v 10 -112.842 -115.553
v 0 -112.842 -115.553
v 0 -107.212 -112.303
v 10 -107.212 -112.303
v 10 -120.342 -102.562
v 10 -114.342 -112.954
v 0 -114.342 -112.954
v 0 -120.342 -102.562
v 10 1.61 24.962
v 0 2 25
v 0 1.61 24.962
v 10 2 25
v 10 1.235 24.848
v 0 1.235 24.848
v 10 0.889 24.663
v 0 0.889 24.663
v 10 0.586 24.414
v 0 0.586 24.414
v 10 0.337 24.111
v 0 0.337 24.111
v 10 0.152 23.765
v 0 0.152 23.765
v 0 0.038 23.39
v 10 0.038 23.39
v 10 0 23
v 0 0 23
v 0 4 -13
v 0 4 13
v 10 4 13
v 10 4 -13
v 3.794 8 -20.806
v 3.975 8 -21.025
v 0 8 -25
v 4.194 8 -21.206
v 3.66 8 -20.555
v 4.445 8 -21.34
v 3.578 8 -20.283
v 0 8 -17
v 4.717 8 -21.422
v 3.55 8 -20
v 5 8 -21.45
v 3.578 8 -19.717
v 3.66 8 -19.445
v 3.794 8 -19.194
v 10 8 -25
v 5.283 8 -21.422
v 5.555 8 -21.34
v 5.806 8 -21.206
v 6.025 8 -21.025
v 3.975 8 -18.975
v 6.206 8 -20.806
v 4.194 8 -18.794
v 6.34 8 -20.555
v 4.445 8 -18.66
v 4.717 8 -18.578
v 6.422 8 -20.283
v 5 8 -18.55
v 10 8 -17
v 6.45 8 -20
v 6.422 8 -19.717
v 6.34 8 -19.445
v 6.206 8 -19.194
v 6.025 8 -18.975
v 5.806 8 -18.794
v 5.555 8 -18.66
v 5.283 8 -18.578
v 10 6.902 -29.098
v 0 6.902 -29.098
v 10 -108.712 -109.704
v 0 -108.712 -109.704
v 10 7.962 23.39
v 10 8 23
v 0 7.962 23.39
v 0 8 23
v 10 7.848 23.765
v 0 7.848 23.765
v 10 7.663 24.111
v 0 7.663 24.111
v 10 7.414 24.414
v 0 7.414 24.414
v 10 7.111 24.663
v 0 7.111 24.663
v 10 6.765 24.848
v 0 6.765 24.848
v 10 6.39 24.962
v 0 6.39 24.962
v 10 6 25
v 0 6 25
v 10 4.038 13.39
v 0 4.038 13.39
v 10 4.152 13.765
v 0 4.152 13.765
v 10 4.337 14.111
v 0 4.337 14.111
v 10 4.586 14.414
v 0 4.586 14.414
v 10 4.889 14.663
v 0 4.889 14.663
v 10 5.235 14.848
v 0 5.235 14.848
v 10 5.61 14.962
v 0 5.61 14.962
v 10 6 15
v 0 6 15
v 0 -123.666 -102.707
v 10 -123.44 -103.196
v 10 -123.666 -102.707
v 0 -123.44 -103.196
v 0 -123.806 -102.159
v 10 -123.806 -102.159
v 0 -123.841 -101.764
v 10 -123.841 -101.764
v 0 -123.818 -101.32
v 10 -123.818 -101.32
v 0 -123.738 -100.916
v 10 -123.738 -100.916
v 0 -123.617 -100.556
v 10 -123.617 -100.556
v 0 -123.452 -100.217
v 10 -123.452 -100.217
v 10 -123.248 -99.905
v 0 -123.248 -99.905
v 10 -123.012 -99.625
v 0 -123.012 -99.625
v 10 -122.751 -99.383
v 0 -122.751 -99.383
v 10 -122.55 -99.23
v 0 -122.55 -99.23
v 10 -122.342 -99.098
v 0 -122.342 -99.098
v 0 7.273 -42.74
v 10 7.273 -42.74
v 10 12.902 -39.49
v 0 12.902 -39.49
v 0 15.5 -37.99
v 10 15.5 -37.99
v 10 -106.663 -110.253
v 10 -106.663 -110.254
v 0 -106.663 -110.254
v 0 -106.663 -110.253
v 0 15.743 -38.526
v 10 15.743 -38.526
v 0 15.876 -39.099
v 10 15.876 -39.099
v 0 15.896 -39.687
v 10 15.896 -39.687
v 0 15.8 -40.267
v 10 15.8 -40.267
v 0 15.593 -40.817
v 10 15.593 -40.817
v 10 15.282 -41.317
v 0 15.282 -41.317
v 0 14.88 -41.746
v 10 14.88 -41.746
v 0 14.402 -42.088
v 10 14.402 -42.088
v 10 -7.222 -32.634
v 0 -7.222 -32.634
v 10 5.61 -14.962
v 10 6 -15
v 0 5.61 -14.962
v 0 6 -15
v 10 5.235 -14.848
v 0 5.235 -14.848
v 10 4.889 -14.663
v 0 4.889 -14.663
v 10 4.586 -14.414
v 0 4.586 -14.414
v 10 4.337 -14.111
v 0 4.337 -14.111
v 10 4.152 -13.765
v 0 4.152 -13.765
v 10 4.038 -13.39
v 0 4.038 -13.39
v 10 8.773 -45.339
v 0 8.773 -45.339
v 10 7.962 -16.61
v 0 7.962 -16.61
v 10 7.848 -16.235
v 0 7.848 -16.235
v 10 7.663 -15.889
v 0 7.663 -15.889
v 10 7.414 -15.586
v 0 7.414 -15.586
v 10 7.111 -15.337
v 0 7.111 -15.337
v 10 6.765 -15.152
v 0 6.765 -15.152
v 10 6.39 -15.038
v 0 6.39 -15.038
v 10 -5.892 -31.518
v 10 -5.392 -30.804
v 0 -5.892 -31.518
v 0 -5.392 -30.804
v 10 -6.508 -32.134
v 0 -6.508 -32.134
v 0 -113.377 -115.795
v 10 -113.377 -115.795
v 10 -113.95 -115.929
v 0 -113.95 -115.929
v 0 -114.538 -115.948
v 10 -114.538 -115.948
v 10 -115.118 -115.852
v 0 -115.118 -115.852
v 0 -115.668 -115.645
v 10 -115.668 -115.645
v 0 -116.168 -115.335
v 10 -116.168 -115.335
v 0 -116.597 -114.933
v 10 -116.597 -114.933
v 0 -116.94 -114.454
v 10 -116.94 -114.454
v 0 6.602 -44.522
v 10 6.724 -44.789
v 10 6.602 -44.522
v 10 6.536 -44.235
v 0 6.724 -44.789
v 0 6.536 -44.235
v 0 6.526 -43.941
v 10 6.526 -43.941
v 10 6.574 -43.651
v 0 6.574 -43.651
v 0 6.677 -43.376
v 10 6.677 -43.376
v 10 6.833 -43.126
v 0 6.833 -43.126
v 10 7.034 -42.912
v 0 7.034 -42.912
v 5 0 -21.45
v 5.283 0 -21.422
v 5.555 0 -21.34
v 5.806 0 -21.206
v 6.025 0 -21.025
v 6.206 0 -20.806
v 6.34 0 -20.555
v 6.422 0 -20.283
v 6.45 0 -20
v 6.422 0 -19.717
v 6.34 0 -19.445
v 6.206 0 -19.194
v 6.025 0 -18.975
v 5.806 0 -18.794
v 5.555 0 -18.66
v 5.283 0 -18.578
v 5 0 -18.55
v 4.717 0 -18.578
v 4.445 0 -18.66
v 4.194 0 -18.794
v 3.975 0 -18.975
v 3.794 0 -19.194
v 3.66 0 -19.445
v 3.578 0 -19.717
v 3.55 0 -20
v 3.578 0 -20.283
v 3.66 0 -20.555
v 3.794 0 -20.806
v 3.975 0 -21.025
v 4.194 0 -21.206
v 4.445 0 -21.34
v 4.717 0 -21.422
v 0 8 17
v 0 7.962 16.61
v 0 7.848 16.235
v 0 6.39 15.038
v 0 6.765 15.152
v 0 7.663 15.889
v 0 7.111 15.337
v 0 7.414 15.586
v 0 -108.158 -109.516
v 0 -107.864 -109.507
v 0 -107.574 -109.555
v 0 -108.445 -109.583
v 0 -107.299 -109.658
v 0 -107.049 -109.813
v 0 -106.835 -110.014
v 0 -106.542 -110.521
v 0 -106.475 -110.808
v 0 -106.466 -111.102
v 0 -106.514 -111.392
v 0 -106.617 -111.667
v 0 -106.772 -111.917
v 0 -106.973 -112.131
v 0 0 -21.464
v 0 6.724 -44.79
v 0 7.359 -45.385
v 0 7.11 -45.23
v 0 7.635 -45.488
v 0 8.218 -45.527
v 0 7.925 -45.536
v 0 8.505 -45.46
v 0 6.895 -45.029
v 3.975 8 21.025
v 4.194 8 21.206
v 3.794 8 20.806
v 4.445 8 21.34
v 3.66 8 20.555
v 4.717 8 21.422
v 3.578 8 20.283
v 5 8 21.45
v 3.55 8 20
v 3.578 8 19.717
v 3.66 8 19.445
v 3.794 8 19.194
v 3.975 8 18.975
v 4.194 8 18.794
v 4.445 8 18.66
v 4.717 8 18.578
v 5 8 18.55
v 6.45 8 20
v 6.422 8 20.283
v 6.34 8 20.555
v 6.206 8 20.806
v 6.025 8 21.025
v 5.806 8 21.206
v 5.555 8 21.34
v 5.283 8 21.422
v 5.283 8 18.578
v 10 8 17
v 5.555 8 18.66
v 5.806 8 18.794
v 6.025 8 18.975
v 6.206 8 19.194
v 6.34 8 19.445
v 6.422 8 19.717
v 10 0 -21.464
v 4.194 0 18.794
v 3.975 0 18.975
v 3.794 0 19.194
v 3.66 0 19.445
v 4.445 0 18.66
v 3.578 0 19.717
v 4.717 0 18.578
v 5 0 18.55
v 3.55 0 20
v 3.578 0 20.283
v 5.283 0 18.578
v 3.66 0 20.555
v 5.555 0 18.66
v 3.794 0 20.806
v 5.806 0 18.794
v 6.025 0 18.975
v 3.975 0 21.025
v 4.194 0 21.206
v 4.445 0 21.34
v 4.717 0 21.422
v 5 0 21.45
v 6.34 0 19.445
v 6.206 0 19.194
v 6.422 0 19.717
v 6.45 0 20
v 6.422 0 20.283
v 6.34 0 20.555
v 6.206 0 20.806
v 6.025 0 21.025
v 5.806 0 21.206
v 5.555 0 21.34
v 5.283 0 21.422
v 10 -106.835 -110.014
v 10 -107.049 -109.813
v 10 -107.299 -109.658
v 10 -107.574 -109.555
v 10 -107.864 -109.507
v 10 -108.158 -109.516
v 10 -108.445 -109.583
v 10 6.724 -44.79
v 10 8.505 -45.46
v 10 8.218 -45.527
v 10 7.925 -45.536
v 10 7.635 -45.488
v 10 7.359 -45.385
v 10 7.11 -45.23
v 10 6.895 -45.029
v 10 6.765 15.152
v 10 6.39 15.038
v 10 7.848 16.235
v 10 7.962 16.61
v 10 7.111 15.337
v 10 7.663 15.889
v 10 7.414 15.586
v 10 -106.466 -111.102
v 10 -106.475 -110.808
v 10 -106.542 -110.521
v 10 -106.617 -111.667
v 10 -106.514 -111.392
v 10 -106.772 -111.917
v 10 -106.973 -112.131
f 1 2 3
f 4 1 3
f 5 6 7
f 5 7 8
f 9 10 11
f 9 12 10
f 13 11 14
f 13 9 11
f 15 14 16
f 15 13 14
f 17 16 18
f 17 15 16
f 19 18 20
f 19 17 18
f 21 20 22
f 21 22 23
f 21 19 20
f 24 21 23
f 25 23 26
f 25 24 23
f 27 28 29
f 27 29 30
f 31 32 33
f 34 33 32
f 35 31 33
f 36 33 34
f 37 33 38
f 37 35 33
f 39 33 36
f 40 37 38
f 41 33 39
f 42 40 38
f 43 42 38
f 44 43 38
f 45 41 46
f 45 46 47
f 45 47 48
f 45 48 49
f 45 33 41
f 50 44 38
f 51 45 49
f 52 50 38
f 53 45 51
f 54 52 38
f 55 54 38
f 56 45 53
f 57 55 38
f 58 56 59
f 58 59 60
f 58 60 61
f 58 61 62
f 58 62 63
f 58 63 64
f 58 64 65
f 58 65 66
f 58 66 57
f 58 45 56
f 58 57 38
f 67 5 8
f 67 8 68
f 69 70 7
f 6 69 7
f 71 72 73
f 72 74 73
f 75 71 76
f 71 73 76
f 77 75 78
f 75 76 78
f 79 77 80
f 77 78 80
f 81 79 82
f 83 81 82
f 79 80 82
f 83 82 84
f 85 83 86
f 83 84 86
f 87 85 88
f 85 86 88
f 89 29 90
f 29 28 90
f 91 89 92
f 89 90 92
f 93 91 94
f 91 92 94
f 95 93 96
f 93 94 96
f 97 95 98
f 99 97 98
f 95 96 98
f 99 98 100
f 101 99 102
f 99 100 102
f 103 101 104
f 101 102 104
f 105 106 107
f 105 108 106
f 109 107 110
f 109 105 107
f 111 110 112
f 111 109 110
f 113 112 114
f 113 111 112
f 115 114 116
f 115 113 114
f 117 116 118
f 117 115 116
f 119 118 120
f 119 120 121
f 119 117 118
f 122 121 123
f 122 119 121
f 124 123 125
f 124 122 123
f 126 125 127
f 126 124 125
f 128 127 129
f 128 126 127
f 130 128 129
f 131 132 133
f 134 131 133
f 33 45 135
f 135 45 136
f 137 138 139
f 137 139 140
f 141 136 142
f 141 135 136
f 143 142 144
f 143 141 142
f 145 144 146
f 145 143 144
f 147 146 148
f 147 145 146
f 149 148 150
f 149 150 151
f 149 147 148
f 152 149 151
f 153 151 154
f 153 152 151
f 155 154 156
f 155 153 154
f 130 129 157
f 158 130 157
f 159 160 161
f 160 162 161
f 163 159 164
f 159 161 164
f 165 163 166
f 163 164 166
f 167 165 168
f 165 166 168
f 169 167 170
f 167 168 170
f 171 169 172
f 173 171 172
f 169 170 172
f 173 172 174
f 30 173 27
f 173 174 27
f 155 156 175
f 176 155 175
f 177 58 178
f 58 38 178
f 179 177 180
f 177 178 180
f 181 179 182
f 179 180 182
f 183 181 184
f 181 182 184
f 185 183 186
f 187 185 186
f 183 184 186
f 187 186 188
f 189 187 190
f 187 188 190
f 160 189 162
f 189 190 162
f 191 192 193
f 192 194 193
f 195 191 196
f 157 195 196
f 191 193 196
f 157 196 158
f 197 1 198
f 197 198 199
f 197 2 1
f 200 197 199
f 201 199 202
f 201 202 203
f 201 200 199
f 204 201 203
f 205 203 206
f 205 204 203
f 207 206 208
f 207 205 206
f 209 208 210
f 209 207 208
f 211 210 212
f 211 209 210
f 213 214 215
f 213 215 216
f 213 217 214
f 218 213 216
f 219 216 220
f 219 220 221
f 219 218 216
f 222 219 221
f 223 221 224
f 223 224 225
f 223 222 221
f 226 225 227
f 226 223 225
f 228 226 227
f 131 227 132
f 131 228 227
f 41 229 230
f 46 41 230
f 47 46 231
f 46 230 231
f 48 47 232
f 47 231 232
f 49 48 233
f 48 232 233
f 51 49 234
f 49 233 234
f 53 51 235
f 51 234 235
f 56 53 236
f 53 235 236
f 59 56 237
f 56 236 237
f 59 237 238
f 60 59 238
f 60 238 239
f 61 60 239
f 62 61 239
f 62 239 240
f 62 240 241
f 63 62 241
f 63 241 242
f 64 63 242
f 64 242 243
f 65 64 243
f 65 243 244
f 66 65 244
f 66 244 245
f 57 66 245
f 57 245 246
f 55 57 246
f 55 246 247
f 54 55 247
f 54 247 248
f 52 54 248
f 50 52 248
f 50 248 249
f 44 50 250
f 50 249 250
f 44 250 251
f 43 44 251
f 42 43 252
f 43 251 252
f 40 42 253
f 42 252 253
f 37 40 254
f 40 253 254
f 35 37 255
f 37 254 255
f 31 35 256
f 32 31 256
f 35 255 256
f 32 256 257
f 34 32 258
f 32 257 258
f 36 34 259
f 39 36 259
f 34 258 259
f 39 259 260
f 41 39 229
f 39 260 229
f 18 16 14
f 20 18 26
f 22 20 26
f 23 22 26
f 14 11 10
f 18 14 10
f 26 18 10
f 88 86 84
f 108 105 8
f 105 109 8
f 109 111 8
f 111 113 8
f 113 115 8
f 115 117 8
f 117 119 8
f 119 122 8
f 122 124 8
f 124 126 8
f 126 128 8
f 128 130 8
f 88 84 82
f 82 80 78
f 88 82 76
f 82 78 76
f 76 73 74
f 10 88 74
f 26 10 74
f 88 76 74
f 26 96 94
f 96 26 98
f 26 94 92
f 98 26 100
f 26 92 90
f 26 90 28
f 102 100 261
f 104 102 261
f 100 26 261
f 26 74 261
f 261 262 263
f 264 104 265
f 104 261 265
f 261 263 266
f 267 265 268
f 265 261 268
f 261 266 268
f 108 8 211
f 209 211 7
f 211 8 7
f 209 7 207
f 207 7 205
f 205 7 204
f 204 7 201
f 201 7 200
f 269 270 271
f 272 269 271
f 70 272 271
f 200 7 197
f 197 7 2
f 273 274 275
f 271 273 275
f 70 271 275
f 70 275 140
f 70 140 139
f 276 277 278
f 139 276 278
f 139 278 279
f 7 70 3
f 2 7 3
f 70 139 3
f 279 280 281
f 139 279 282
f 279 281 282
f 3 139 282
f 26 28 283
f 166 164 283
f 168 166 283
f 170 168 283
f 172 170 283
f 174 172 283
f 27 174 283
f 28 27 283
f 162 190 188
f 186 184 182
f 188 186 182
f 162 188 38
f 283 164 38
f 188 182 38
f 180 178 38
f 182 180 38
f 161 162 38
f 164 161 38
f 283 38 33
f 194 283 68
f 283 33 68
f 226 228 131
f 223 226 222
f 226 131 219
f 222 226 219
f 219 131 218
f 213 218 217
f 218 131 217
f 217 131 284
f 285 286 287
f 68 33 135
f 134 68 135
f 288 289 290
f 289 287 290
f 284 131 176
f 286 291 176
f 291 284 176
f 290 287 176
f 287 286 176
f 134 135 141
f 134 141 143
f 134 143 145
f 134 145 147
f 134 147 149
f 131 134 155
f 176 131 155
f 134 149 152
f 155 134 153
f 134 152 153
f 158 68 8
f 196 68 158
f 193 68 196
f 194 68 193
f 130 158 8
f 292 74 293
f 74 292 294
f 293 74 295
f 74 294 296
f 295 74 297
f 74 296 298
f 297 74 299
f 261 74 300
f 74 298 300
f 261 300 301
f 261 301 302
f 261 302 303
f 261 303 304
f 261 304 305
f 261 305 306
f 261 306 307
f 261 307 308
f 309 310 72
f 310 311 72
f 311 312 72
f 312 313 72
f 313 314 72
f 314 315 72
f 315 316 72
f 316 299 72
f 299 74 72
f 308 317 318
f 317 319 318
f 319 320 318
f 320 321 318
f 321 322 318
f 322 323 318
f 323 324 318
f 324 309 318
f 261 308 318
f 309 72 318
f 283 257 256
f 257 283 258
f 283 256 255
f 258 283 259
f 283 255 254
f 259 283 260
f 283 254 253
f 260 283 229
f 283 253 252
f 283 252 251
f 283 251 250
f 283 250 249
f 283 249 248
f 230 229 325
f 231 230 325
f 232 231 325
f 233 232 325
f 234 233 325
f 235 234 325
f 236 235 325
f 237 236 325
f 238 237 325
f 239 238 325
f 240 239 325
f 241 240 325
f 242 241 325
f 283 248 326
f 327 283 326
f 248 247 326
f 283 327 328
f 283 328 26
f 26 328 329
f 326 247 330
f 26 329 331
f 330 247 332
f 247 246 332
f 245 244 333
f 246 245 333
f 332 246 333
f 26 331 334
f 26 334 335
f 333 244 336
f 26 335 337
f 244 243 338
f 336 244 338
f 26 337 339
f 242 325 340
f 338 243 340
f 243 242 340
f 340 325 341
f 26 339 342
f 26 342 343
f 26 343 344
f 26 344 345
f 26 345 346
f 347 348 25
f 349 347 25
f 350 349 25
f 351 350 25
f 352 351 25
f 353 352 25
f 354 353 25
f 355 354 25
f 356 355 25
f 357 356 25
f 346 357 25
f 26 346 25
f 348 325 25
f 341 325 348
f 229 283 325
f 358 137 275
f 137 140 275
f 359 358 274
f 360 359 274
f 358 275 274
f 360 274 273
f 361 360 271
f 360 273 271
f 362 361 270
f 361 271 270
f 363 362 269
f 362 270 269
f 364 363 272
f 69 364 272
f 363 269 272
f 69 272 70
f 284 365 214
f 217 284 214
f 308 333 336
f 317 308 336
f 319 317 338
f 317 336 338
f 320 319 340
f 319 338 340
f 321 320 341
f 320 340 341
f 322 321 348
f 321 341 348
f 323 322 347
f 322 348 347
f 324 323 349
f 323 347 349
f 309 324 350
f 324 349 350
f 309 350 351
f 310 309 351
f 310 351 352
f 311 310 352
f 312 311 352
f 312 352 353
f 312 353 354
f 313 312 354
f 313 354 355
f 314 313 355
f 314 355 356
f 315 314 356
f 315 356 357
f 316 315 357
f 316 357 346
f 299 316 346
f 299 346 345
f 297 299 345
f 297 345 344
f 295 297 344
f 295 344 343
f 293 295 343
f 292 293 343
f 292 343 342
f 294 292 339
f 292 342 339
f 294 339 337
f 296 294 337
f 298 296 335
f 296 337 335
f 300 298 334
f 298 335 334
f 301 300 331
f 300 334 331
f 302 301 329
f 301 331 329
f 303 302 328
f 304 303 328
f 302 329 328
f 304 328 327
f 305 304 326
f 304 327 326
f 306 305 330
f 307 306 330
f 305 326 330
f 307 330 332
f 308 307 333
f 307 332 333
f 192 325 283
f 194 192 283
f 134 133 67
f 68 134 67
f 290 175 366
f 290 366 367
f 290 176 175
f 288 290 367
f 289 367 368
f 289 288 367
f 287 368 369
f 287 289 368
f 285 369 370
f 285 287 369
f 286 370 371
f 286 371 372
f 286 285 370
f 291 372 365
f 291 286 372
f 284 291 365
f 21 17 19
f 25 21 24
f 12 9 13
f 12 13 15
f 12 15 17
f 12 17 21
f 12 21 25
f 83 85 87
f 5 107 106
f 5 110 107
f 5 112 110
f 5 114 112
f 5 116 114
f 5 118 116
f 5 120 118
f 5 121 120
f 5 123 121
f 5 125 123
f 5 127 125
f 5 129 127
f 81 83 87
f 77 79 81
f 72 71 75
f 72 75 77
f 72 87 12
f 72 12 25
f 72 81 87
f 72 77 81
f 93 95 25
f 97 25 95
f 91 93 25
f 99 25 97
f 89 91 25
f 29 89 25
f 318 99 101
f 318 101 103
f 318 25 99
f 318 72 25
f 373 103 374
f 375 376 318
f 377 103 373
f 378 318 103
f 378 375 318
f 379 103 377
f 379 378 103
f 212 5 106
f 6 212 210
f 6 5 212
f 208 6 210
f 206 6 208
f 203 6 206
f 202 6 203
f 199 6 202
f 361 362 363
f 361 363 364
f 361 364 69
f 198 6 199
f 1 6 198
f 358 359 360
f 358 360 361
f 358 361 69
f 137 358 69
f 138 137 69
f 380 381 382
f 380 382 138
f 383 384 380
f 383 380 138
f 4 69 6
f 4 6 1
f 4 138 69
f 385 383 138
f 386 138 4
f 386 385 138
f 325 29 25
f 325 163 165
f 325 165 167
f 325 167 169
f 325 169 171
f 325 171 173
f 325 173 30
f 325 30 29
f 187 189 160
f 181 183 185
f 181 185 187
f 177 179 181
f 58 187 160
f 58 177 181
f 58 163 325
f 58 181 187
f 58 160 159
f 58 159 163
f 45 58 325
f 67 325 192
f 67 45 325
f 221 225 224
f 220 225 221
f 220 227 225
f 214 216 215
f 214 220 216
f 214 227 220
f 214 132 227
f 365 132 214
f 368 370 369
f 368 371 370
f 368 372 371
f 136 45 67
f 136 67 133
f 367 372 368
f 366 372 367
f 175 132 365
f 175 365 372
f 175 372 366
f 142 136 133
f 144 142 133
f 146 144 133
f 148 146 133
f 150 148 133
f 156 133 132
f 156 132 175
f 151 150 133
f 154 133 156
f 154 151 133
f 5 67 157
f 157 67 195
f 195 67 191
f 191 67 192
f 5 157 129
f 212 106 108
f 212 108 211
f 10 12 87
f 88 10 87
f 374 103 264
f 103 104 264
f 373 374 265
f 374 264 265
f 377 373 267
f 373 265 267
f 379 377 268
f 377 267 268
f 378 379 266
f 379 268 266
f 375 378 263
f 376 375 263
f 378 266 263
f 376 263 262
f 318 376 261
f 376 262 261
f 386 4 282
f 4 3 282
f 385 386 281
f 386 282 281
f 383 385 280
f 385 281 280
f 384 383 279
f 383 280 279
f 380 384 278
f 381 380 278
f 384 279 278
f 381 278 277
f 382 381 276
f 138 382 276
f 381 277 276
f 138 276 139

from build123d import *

# Parameters (mm, degrees)
EXTRUDE_1_DEPTH     = 10
SKETCH_4_W          = 10
SKETCH_4_H          = 4
EXTRUDE_2_DEPTH     = 10
CUT_EXTRUDE_1_REACH = 164.425
SKETCH_2_R          = 1.45
FILLET_1_R          = 2
EXTRUDE_3_DEPTH     = 10
FILLET_5_R          = 1.5
EXTRUDE_4_DEPTH     = 10
CUT_EXTRUDE_3_REACH = 174.593
FILLET_3_R          = 3
CHAMFER_1_SIZE      = 7
FILLET_7_R          = 5


with BuildPart() as part:
    # 草图1 → 拉伸-薄壁1 (new body)
    with BuildSketch(Plane(origin=(0, 0, 0), x_dir=(0, 0, -1), z_dir=(1, 0, 0))):
        Polygon((98, -126.439708953), (25, 0), (-25, 0), (-25, 4), (27.309401077, 4), (101.464101615, -124.439708953), align=None)
    extrude(amount=EXTRUDE_1_DEPTH)

    # 草图4 → 凸台-拉伸2 (add)
    with BuildSketch(Plane(origin=(10, 0, 0), x_dir=(0, 0, -1), z_dir=(1, 0, 0))):
        Polygon((27.309401077, 4), (25, 8), (15, 8), (15, 4), align=None)
        with Locations((-20, 6)):
            Rectangle(SKETCH_4_W, SKETCH_4_H)
    extrude(amount=-EXTRUDE_2_DEPTH)

    # 草图2 → 切除-拉伸1 (cut, up to next)
    with BuildSketch(Plane.XZ, mode=Mode.PRIVATE) as cut_extrude_1_sk1:
        with Locations(Location((5, 20, 0), (0, 0, 270))):
            Circle(SKETCH_2_R)
    cut_extrude_1_tool1 = extrude(cut_extrude_1_sk1.sketch, amount=-CUT_EXTRUDE_1_REACH, mode=Mode.PRIVATE) & part.part
    # 草图2 → 切除-拉伸1 (cut, up to next)
    with BuildSketch(Plane.XZ, mode=Mode.PRIVATE) as cut_extrude_1_sk2:
        with Locations(Location((5, -20, 0), (0, 0, 270))):
            Circle(SKETCH_2_R)
    cut_extrude_1_tool2 = extrude(cut_extrude_1_sk2.sketch, amount=-CUT_EXTRUDE_1_REACH, mode=Mode.PRIVATE) & part.part
    add(cut_extrude_1_tool1.solids().sort_by_distance((5, 0, 20))[0], mode=Mode.SUBTRACT)
    add(cut_extrude_1_tool2.solids().sort_by_distance((5, 0, -20))[0], mode=Mode.SUBTRACT)

    # 圆角1
    fillet_1_edges = [part.edges().sort_by_distance(p)[0] for p in [
        (5, 8, 25),
        (5, 4, 15),
        (5, 8, 15),
        (5, 4, -15),
        (5, 8, -15),
        (5, 0, 25),
    ]]
    fillet(fillet_1_edges, radius=FILLET_1_R - 0.0001)  # a hair under: the kernel refuses the full size

    # 草图6 → 凸台-拉伸3 (add)
    with BuildSketch(Plane(origin=(10, 0, 0), x_dir=(0, 0, -1), z_dir=(1, 0, 0))):
        Polygon((25, 8), (40.588457268, 17), (46.088457268, 7.473720558), (43.490381057, 5.973720558), (39.490381057, 12.901923789), (26.5, 5.401923789), align=None)
        Polygon((99.964101615, -121.841632741), (101.464101615, -124.439708953), (117.052558883, -115.439708953), (111.552558883, -105.913429511), (108.954482672, -107.413429511), (112.954482672, -114.341632741), align=None)
    extrude(amount=-EXTRUDE_3_DEPTH)

    # 圆角5
    fillet_5_edges = [part.edges().sort_by_distance(p)[0] for p in [
        (5, -107.413429511, -108.954482672),
        (5, -105.913429511, -111.552558883),
        (5, 5.973720558, -43.490381057),
        (5, 7.473720558, -46.088457268),
    ]]
    fillet(fillet_5_edges, radius=FILLET_5_R - 0.0001)  # a hair under: the kernel refuses the full size

    # 草图7 → 凸台-拉伸4 (add)
    with BuildSketch(Plane(origin=(10, 0, 0), x_dir=(0, 0, -1), z_dir=(1, 0, 0))):
        Polygon((26.5, 5.401923789), (99.964101615, -121.841632741), (102.562177826, -120.341632741), (29.098076211, 6.901923789), align=None)
    extrude(amount=-EXTRUDE_4_DEPTH)

    # 草图8 → 切除-拉伸3 (cut, up to next)
    with BuildSketch(Plane(origin=(10, 0, 0), x_dir=(0, 0, -1), z_dir=(1, 0, 0)), mode=Mode.PRIVATE) as cut_extrude_3_sk1:
        Polygon((25, 0), (98, -126.439708953), (100.598076211, -124.939708953), (28.464101615, 0), align=None)
    cut_extrude_3_tool1 = extrude(cut_extrude_3_sk1.sketch, amount=-CUT_EXTRUDE_3_REACH, mode=Mode.PRIVATE) & part.part
    add(cut_extrude_3_tool1.solids().sort_by_distance((10, -62.8456, -63.01253))[0], mode=Mode.SUBTRACT)

    # 圆角3
    fillet_3_edges = [part.edges().sort_by_distance(p)[0] for p in [
        (5, -115.439708953, -117.052558883),
        (5, -124.939708953, -100.598076211),
        (5, 17, -40.588457268),
    ]]
    fillet(fillet_3_edges, radius=FILLET_3_R)

    # 倒角1
    chamfer_1_edges = [part.edges().sort_by_distance(p)[0] for p in [
        (5, 0, -28.464101615),
    ]]
    chamfer(chamfer_1_edges, length=CHAMFER_1_SIZE)

    # 圆角7
    fillet_7_edges = [part.edges().sort_by_distance(p)[0] for p in [
        (5, -6.062177826, -31.964101615),
    ]]
    fillet(fillet_7_edges, radius=FILLET_7_R)


solid = part.part
